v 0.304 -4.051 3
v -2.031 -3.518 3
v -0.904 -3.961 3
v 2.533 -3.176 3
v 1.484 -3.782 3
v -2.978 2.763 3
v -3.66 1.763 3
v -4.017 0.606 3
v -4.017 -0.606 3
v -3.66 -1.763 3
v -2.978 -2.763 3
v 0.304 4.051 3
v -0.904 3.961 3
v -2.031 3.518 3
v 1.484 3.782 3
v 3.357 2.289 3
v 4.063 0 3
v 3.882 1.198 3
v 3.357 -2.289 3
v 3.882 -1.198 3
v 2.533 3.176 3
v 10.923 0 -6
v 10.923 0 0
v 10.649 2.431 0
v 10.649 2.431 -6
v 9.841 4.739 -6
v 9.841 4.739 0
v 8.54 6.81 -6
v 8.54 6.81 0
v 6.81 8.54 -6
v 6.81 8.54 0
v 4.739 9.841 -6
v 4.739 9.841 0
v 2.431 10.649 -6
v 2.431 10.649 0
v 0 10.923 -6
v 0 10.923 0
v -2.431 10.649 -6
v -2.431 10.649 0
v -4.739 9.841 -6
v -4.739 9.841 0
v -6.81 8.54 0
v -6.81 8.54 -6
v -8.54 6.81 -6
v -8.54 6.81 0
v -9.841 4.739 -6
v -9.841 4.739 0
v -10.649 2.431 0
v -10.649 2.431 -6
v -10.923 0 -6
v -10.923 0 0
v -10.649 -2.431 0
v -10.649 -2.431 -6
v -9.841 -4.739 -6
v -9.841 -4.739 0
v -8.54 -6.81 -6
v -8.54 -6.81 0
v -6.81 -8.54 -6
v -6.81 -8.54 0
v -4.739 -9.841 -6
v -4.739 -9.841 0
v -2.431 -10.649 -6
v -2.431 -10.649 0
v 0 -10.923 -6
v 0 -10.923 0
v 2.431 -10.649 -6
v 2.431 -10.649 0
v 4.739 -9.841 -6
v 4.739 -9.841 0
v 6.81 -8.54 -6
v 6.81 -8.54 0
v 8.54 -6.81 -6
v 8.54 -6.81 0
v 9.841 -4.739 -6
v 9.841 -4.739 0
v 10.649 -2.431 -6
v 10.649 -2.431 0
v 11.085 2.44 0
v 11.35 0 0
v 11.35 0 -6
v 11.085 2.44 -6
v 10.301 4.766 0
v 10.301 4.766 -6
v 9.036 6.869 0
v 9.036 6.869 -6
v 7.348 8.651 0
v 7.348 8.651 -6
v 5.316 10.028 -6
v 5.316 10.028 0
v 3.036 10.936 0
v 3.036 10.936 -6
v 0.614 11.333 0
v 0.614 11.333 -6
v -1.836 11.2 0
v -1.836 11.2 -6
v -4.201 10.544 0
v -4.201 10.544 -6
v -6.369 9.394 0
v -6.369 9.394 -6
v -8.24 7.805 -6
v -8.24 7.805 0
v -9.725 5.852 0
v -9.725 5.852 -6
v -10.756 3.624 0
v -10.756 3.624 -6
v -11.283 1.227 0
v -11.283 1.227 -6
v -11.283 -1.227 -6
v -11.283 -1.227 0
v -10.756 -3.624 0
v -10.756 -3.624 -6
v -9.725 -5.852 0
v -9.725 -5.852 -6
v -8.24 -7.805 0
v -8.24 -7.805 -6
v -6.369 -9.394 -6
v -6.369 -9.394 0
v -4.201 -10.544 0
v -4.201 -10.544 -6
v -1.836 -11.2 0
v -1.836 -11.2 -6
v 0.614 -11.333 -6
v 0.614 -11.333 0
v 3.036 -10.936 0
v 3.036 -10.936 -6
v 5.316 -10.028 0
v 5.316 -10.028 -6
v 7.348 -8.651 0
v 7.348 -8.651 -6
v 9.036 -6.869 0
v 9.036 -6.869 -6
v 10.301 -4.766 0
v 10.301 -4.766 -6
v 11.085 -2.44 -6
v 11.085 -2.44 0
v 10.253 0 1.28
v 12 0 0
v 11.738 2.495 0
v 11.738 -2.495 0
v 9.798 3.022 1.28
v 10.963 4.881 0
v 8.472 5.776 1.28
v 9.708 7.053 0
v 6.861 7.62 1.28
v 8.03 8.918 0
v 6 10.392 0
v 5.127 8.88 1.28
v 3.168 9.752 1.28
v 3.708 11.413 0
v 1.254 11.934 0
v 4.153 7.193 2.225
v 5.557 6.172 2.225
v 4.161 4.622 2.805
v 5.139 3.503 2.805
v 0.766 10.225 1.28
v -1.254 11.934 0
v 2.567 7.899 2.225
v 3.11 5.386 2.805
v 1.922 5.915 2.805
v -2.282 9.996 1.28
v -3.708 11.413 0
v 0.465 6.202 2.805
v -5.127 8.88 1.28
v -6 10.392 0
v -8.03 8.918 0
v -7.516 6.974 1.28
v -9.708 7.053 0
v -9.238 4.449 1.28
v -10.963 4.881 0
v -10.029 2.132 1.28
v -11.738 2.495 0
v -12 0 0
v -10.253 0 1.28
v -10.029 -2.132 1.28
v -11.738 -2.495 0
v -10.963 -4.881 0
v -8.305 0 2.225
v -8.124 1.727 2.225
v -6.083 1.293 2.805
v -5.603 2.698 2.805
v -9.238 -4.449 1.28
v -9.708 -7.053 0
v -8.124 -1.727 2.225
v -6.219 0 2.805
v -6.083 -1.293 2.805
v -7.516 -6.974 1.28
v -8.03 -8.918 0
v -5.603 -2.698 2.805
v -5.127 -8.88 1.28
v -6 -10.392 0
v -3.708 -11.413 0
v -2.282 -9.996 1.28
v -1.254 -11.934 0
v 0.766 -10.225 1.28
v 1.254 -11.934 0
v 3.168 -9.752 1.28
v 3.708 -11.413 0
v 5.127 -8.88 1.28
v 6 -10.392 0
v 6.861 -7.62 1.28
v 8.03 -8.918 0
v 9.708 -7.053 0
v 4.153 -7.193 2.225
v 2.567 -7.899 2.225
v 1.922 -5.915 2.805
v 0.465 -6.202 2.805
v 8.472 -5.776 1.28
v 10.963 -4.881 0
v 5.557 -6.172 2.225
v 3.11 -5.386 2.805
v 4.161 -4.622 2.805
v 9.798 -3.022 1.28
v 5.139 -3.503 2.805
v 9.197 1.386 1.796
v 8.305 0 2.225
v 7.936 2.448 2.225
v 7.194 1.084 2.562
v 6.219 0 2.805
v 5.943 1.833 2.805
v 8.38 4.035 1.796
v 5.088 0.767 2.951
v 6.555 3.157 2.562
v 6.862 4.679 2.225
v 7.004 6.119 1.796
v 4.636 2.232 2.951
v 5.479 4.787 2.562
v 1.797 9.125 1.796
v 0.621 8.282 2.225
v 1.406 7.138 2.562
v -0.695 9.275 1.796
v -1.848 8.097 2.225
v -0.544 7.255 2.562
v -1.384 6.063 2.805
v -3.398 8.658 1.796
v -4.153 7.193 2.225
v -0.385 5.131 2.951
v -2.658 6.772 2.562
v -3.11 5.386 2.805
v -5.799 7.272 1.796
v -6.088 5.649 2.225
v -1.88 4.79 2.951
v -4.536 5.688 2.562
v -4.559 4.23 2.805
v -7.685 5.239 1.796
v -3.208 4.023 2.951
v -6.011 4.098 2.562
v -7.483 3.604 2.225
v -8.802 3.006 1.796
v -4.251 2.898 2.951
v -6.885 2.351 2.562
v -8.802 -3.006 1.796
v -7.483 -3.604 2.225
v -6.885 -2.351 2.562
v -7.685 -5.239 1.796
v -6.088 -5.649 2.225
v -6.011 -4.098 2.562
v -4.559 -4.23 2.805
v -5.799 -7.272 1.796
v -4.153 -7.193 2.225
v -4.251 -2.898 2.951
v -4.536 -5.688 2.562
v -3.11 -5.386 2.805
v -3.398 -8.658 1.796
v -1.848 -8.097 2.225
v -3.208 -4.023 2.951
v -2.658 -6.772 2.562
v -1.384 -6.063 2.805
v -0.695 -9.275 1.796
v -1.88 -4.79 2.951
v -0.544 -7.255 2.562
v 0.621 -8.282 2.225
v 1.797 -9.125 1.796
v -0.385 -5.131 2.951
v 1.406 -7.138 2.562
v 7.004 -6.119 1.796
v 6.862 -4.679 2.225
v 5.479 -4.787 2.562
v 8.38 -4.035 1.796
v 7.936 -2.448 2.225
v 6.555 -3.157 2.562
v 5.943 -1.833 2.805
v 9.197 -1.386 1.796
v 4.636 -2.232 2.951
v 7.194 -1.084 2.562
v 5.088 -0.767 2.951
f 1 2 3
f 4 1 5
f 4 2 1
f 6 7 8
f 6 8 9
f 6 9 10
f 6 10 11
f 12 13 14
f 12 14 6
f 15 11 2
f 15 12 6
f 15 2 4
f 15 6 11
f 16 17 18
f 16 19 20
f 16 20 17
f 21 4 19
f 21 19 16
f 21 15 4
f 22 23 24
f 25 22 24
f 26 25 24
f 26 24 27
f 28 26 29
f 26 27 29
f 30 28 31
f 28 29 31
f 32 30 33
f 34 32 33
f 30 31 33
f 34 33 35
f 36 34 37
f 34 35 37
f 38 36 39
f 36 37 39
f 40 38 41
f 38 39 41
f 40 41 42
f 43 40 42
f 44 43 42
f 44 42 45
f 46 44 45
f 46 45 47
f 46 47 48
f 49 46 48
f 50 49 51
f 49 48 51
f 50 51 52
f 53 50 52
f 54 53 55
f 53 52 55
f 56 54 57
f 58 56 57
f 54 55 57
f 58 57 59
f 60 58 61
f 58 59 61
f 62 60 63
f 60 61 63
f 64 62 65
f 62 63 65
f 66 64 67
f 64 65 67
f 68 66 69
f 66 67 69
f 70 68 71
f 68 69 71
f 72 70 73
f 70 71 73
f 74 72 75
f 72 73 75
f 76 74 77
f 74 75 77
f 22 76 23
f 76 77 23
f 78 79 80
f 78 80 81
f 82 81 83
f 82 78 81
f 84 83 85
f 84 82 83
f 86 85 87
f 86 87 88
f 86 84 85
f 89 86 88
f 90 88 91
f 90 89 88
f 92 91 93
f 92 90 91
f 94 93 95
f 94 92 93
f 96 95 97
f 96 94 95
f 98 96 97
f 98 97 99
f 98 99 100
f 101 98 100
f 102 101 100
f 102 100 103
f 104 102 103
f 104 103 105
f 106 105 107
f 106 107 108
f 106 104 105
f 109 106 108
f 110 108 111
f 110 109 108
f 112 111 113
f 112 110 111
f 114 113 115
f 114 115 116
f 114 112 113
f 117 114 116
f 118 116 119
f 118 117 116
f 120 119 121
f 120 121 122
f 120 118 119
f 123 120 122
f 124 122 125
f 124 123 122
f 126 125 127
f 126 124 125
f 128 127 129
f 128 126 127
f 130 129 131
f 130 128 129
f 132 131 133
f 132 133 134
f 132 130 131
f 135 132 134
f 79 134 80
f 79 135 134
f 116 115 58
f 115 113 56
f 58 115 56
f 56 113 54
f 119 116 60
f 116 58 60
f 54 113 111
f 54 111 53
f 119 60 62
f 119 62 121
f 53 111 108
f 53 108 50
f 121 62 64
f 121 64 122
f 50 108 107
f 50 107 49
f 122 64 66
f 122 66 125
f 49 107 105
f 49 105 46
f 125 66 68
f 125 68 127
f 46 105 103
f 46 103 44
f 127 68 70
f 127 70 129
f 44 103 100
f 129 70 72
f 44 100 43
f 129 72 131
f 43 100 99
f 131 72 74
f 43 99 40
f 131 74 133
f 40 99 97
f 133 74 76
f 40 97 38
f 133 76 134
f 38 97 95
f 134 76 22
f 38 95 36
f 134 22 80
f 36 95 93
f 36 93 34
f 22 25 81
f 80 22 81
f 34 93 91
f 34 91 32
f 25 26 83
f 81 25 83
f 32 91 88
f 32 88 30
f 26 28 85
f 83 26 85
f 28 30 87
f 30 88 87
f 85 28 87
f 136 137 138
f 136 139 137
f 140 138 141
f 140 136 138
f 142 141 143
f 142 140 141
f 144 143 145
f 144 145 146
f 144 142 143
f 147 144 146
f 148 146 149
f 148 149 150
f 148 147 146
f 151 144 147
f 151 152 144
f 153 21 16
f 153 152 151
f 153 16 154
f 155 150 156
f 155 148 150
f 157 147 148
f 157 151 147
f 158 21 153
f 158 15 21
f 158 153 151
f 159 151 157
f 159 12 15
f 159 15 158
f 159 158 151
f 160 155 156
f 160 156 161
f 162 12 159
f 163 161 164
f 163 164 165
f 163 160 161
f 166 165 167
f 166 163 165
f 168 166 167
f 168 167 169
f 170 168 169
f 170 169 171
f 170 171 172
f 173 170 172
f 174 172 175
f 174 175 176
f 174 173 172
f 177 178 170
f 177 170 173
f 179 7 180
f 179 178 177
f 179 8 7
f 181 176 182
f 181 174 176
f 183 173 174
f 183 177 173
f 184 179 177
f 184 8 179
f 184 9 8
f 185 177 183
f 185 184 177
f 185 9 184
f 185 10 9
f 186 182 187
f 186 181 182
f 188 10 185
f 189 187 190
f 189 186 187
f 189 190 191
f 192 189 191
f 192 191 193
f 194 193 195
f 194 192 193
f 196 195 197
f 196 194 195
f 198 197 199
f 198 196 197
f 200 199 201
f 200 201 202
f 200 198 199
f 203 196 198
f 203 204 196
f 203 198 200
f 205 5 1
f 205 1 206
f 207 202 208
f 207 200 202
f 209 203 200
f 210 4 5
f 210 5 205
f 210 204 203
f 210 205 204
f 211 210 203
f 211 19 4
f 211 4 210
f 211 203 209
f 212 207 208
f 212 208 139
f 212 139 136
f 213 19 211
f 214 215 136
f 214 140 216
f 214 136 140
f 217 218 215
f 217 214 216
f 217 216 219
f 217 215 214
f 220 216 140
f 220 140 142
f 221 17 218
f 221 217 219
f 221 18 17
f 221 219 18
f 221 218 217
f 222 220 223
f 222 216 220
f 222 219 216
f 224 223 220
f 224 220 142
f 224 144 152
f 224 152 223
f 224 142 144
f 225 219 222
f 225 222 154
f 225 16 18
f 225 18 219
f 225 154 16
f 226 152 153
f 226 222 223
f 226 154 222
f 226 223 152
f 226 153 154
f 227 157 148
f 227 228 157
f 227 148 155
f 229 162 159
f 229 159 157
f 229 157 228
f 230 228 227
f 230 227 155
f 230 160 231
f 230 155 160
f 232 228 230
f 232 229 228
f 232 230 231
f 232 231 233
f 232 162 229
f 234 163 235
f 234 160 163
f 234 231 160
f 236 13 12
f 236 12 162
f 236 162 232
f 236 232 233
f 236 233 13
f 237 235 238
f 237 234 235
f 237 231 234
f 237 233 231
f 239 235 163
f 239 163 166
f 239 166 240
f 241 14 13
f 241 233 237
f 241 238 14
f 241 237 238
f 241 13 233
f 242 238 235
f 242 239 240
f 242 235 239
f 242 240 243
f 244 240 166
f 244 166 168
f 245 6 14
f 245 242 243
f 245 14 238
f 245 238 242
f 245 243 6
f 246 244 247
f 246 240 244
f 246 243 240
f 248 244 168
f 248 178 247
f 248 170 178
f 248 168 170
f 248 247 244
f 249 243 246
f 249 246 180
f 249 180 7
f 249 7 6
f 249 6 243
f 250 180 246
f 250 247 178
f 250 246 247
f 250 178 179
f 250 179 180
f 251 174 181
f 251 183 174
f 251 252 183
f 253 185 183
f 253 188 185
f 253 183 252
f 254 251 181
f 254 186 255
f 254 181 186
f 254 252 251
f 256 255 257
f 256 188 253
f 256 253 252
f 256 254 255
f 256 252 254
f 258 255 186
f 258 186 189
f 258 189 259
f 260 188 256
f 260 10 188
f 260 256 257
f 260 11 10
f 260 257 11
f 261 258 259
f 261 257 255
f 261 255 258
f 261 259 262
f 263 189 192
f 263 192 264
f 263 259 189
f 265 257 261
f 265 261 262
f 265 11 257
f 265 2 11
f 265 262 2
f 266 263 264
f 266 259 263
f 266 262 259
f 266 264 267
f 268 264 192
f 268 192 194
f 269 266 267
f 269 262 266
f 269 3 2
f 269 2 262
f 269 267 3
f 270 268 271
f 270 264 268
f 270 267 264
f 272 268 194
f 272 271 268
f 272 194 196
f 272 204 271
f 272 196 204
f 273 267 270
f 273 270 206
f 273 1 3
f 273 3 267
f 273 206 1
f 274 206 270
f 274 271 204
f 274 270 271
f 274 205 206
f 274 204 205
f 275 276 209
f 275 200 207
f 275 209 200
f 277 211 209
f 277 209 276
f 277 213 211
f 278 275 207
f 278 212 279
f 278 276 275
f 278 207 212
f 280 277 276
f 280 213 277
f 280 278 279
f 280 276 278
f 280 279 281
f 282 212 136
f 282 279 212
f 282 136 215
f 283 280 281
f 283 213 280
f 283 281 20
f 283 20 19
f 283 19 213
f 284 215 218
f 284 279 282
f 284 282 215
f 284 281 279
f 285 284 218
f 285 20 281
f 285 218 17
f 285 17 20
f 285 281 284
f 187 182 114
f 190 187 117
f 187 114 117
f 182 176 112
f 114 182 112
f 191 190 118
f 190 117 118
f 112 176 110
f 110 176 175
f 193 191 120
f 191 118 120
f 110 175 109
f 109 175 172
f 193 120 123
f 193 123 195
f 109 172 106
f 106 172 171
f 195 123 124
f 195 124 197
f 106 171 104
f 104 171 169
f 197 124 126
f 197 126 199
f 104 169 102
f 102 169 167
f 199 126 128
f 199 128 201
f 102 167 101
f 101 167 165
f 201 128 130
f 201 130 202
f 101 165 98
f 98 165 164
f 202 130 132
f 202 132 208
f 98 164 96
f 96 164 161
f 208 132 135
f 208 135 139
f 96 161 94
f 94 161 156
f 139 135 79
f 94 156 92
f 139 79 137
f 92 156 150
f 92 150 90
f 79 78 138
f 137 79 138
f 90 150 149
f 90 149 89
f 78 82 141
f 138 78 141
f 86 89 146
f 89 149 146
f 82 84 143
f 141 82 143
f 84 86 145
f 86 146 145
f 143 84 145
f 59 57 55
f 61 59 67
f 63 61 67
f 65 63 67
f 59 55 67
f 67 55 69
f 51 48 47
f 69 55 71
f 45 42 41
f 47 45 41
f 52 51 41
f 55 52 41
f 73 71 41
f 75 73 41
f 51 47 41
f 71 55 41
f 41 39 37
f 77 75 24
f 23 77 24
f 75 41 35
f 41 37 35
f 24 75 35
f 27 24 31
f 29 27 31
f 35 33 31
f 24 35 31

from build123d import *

# Parameters (mm, degrees)
F0_R     = 11.35
F0_R_2   = 10.9231311618
F1_DEPTH = 6
F0_R_3   = 12
F2_DEPTH = 3


# Not quite as in the source:
# - a fillet or chamfer that OpenCascade refuses, or shapes differently, is made with other operations: its cross-section is extruded or revolved along the edge and cut away or added


with BuildPart() as f1:
    # F0 (on Top) → F1 (new body)
    with BuildSketch(Plane.XY):
        Circle(F0_R)
        Circle(F0_R_2, mode=Mode.SUBTRACT)
    extrude(amount=-F1_DEPTH)

    # F0 (on Top) → F2 (join)
    with BuildSketch(Plane.XY):
        Circle(F0_R_3)
        Circle(F0_R, mode=Mode.SUBTRACT)
        Circle(F0_R)
        Circle(F0_R_2, mode=Mode.SUBTRACT)
        Circle(F0_R_2)
    extrude(amount=F2_DEPTH)

    # F3: fillet of radius 12 on 1 edges, made by hand

    # F3_s1 → F3_t2 (revolve, cut)
    with BuildSketch(Plane.XZ):
        with BuildLine():
            ThreePointArc((12, 0), (8.3053867539, 2.2249721603), (4.0627460668, 3))
            Line((4.0627460668, 3), (4.0627460668, 3.24))
            Line((4.0627460668, 3.24), (12, 3.24))
            Line((12, 3.24), (12.24, 3))
            ThreePointArc((12.24, 3), (12.24, 1.5), (12.1587450787, 0.18))
            Line((12.1587450787, 0.18), (12, 0))
        make_face()
    revolve(axis=Axis((0, 0, 3), (0, 0, 1)), mode=Mode.SUBTRACT)


solid = f1.part
